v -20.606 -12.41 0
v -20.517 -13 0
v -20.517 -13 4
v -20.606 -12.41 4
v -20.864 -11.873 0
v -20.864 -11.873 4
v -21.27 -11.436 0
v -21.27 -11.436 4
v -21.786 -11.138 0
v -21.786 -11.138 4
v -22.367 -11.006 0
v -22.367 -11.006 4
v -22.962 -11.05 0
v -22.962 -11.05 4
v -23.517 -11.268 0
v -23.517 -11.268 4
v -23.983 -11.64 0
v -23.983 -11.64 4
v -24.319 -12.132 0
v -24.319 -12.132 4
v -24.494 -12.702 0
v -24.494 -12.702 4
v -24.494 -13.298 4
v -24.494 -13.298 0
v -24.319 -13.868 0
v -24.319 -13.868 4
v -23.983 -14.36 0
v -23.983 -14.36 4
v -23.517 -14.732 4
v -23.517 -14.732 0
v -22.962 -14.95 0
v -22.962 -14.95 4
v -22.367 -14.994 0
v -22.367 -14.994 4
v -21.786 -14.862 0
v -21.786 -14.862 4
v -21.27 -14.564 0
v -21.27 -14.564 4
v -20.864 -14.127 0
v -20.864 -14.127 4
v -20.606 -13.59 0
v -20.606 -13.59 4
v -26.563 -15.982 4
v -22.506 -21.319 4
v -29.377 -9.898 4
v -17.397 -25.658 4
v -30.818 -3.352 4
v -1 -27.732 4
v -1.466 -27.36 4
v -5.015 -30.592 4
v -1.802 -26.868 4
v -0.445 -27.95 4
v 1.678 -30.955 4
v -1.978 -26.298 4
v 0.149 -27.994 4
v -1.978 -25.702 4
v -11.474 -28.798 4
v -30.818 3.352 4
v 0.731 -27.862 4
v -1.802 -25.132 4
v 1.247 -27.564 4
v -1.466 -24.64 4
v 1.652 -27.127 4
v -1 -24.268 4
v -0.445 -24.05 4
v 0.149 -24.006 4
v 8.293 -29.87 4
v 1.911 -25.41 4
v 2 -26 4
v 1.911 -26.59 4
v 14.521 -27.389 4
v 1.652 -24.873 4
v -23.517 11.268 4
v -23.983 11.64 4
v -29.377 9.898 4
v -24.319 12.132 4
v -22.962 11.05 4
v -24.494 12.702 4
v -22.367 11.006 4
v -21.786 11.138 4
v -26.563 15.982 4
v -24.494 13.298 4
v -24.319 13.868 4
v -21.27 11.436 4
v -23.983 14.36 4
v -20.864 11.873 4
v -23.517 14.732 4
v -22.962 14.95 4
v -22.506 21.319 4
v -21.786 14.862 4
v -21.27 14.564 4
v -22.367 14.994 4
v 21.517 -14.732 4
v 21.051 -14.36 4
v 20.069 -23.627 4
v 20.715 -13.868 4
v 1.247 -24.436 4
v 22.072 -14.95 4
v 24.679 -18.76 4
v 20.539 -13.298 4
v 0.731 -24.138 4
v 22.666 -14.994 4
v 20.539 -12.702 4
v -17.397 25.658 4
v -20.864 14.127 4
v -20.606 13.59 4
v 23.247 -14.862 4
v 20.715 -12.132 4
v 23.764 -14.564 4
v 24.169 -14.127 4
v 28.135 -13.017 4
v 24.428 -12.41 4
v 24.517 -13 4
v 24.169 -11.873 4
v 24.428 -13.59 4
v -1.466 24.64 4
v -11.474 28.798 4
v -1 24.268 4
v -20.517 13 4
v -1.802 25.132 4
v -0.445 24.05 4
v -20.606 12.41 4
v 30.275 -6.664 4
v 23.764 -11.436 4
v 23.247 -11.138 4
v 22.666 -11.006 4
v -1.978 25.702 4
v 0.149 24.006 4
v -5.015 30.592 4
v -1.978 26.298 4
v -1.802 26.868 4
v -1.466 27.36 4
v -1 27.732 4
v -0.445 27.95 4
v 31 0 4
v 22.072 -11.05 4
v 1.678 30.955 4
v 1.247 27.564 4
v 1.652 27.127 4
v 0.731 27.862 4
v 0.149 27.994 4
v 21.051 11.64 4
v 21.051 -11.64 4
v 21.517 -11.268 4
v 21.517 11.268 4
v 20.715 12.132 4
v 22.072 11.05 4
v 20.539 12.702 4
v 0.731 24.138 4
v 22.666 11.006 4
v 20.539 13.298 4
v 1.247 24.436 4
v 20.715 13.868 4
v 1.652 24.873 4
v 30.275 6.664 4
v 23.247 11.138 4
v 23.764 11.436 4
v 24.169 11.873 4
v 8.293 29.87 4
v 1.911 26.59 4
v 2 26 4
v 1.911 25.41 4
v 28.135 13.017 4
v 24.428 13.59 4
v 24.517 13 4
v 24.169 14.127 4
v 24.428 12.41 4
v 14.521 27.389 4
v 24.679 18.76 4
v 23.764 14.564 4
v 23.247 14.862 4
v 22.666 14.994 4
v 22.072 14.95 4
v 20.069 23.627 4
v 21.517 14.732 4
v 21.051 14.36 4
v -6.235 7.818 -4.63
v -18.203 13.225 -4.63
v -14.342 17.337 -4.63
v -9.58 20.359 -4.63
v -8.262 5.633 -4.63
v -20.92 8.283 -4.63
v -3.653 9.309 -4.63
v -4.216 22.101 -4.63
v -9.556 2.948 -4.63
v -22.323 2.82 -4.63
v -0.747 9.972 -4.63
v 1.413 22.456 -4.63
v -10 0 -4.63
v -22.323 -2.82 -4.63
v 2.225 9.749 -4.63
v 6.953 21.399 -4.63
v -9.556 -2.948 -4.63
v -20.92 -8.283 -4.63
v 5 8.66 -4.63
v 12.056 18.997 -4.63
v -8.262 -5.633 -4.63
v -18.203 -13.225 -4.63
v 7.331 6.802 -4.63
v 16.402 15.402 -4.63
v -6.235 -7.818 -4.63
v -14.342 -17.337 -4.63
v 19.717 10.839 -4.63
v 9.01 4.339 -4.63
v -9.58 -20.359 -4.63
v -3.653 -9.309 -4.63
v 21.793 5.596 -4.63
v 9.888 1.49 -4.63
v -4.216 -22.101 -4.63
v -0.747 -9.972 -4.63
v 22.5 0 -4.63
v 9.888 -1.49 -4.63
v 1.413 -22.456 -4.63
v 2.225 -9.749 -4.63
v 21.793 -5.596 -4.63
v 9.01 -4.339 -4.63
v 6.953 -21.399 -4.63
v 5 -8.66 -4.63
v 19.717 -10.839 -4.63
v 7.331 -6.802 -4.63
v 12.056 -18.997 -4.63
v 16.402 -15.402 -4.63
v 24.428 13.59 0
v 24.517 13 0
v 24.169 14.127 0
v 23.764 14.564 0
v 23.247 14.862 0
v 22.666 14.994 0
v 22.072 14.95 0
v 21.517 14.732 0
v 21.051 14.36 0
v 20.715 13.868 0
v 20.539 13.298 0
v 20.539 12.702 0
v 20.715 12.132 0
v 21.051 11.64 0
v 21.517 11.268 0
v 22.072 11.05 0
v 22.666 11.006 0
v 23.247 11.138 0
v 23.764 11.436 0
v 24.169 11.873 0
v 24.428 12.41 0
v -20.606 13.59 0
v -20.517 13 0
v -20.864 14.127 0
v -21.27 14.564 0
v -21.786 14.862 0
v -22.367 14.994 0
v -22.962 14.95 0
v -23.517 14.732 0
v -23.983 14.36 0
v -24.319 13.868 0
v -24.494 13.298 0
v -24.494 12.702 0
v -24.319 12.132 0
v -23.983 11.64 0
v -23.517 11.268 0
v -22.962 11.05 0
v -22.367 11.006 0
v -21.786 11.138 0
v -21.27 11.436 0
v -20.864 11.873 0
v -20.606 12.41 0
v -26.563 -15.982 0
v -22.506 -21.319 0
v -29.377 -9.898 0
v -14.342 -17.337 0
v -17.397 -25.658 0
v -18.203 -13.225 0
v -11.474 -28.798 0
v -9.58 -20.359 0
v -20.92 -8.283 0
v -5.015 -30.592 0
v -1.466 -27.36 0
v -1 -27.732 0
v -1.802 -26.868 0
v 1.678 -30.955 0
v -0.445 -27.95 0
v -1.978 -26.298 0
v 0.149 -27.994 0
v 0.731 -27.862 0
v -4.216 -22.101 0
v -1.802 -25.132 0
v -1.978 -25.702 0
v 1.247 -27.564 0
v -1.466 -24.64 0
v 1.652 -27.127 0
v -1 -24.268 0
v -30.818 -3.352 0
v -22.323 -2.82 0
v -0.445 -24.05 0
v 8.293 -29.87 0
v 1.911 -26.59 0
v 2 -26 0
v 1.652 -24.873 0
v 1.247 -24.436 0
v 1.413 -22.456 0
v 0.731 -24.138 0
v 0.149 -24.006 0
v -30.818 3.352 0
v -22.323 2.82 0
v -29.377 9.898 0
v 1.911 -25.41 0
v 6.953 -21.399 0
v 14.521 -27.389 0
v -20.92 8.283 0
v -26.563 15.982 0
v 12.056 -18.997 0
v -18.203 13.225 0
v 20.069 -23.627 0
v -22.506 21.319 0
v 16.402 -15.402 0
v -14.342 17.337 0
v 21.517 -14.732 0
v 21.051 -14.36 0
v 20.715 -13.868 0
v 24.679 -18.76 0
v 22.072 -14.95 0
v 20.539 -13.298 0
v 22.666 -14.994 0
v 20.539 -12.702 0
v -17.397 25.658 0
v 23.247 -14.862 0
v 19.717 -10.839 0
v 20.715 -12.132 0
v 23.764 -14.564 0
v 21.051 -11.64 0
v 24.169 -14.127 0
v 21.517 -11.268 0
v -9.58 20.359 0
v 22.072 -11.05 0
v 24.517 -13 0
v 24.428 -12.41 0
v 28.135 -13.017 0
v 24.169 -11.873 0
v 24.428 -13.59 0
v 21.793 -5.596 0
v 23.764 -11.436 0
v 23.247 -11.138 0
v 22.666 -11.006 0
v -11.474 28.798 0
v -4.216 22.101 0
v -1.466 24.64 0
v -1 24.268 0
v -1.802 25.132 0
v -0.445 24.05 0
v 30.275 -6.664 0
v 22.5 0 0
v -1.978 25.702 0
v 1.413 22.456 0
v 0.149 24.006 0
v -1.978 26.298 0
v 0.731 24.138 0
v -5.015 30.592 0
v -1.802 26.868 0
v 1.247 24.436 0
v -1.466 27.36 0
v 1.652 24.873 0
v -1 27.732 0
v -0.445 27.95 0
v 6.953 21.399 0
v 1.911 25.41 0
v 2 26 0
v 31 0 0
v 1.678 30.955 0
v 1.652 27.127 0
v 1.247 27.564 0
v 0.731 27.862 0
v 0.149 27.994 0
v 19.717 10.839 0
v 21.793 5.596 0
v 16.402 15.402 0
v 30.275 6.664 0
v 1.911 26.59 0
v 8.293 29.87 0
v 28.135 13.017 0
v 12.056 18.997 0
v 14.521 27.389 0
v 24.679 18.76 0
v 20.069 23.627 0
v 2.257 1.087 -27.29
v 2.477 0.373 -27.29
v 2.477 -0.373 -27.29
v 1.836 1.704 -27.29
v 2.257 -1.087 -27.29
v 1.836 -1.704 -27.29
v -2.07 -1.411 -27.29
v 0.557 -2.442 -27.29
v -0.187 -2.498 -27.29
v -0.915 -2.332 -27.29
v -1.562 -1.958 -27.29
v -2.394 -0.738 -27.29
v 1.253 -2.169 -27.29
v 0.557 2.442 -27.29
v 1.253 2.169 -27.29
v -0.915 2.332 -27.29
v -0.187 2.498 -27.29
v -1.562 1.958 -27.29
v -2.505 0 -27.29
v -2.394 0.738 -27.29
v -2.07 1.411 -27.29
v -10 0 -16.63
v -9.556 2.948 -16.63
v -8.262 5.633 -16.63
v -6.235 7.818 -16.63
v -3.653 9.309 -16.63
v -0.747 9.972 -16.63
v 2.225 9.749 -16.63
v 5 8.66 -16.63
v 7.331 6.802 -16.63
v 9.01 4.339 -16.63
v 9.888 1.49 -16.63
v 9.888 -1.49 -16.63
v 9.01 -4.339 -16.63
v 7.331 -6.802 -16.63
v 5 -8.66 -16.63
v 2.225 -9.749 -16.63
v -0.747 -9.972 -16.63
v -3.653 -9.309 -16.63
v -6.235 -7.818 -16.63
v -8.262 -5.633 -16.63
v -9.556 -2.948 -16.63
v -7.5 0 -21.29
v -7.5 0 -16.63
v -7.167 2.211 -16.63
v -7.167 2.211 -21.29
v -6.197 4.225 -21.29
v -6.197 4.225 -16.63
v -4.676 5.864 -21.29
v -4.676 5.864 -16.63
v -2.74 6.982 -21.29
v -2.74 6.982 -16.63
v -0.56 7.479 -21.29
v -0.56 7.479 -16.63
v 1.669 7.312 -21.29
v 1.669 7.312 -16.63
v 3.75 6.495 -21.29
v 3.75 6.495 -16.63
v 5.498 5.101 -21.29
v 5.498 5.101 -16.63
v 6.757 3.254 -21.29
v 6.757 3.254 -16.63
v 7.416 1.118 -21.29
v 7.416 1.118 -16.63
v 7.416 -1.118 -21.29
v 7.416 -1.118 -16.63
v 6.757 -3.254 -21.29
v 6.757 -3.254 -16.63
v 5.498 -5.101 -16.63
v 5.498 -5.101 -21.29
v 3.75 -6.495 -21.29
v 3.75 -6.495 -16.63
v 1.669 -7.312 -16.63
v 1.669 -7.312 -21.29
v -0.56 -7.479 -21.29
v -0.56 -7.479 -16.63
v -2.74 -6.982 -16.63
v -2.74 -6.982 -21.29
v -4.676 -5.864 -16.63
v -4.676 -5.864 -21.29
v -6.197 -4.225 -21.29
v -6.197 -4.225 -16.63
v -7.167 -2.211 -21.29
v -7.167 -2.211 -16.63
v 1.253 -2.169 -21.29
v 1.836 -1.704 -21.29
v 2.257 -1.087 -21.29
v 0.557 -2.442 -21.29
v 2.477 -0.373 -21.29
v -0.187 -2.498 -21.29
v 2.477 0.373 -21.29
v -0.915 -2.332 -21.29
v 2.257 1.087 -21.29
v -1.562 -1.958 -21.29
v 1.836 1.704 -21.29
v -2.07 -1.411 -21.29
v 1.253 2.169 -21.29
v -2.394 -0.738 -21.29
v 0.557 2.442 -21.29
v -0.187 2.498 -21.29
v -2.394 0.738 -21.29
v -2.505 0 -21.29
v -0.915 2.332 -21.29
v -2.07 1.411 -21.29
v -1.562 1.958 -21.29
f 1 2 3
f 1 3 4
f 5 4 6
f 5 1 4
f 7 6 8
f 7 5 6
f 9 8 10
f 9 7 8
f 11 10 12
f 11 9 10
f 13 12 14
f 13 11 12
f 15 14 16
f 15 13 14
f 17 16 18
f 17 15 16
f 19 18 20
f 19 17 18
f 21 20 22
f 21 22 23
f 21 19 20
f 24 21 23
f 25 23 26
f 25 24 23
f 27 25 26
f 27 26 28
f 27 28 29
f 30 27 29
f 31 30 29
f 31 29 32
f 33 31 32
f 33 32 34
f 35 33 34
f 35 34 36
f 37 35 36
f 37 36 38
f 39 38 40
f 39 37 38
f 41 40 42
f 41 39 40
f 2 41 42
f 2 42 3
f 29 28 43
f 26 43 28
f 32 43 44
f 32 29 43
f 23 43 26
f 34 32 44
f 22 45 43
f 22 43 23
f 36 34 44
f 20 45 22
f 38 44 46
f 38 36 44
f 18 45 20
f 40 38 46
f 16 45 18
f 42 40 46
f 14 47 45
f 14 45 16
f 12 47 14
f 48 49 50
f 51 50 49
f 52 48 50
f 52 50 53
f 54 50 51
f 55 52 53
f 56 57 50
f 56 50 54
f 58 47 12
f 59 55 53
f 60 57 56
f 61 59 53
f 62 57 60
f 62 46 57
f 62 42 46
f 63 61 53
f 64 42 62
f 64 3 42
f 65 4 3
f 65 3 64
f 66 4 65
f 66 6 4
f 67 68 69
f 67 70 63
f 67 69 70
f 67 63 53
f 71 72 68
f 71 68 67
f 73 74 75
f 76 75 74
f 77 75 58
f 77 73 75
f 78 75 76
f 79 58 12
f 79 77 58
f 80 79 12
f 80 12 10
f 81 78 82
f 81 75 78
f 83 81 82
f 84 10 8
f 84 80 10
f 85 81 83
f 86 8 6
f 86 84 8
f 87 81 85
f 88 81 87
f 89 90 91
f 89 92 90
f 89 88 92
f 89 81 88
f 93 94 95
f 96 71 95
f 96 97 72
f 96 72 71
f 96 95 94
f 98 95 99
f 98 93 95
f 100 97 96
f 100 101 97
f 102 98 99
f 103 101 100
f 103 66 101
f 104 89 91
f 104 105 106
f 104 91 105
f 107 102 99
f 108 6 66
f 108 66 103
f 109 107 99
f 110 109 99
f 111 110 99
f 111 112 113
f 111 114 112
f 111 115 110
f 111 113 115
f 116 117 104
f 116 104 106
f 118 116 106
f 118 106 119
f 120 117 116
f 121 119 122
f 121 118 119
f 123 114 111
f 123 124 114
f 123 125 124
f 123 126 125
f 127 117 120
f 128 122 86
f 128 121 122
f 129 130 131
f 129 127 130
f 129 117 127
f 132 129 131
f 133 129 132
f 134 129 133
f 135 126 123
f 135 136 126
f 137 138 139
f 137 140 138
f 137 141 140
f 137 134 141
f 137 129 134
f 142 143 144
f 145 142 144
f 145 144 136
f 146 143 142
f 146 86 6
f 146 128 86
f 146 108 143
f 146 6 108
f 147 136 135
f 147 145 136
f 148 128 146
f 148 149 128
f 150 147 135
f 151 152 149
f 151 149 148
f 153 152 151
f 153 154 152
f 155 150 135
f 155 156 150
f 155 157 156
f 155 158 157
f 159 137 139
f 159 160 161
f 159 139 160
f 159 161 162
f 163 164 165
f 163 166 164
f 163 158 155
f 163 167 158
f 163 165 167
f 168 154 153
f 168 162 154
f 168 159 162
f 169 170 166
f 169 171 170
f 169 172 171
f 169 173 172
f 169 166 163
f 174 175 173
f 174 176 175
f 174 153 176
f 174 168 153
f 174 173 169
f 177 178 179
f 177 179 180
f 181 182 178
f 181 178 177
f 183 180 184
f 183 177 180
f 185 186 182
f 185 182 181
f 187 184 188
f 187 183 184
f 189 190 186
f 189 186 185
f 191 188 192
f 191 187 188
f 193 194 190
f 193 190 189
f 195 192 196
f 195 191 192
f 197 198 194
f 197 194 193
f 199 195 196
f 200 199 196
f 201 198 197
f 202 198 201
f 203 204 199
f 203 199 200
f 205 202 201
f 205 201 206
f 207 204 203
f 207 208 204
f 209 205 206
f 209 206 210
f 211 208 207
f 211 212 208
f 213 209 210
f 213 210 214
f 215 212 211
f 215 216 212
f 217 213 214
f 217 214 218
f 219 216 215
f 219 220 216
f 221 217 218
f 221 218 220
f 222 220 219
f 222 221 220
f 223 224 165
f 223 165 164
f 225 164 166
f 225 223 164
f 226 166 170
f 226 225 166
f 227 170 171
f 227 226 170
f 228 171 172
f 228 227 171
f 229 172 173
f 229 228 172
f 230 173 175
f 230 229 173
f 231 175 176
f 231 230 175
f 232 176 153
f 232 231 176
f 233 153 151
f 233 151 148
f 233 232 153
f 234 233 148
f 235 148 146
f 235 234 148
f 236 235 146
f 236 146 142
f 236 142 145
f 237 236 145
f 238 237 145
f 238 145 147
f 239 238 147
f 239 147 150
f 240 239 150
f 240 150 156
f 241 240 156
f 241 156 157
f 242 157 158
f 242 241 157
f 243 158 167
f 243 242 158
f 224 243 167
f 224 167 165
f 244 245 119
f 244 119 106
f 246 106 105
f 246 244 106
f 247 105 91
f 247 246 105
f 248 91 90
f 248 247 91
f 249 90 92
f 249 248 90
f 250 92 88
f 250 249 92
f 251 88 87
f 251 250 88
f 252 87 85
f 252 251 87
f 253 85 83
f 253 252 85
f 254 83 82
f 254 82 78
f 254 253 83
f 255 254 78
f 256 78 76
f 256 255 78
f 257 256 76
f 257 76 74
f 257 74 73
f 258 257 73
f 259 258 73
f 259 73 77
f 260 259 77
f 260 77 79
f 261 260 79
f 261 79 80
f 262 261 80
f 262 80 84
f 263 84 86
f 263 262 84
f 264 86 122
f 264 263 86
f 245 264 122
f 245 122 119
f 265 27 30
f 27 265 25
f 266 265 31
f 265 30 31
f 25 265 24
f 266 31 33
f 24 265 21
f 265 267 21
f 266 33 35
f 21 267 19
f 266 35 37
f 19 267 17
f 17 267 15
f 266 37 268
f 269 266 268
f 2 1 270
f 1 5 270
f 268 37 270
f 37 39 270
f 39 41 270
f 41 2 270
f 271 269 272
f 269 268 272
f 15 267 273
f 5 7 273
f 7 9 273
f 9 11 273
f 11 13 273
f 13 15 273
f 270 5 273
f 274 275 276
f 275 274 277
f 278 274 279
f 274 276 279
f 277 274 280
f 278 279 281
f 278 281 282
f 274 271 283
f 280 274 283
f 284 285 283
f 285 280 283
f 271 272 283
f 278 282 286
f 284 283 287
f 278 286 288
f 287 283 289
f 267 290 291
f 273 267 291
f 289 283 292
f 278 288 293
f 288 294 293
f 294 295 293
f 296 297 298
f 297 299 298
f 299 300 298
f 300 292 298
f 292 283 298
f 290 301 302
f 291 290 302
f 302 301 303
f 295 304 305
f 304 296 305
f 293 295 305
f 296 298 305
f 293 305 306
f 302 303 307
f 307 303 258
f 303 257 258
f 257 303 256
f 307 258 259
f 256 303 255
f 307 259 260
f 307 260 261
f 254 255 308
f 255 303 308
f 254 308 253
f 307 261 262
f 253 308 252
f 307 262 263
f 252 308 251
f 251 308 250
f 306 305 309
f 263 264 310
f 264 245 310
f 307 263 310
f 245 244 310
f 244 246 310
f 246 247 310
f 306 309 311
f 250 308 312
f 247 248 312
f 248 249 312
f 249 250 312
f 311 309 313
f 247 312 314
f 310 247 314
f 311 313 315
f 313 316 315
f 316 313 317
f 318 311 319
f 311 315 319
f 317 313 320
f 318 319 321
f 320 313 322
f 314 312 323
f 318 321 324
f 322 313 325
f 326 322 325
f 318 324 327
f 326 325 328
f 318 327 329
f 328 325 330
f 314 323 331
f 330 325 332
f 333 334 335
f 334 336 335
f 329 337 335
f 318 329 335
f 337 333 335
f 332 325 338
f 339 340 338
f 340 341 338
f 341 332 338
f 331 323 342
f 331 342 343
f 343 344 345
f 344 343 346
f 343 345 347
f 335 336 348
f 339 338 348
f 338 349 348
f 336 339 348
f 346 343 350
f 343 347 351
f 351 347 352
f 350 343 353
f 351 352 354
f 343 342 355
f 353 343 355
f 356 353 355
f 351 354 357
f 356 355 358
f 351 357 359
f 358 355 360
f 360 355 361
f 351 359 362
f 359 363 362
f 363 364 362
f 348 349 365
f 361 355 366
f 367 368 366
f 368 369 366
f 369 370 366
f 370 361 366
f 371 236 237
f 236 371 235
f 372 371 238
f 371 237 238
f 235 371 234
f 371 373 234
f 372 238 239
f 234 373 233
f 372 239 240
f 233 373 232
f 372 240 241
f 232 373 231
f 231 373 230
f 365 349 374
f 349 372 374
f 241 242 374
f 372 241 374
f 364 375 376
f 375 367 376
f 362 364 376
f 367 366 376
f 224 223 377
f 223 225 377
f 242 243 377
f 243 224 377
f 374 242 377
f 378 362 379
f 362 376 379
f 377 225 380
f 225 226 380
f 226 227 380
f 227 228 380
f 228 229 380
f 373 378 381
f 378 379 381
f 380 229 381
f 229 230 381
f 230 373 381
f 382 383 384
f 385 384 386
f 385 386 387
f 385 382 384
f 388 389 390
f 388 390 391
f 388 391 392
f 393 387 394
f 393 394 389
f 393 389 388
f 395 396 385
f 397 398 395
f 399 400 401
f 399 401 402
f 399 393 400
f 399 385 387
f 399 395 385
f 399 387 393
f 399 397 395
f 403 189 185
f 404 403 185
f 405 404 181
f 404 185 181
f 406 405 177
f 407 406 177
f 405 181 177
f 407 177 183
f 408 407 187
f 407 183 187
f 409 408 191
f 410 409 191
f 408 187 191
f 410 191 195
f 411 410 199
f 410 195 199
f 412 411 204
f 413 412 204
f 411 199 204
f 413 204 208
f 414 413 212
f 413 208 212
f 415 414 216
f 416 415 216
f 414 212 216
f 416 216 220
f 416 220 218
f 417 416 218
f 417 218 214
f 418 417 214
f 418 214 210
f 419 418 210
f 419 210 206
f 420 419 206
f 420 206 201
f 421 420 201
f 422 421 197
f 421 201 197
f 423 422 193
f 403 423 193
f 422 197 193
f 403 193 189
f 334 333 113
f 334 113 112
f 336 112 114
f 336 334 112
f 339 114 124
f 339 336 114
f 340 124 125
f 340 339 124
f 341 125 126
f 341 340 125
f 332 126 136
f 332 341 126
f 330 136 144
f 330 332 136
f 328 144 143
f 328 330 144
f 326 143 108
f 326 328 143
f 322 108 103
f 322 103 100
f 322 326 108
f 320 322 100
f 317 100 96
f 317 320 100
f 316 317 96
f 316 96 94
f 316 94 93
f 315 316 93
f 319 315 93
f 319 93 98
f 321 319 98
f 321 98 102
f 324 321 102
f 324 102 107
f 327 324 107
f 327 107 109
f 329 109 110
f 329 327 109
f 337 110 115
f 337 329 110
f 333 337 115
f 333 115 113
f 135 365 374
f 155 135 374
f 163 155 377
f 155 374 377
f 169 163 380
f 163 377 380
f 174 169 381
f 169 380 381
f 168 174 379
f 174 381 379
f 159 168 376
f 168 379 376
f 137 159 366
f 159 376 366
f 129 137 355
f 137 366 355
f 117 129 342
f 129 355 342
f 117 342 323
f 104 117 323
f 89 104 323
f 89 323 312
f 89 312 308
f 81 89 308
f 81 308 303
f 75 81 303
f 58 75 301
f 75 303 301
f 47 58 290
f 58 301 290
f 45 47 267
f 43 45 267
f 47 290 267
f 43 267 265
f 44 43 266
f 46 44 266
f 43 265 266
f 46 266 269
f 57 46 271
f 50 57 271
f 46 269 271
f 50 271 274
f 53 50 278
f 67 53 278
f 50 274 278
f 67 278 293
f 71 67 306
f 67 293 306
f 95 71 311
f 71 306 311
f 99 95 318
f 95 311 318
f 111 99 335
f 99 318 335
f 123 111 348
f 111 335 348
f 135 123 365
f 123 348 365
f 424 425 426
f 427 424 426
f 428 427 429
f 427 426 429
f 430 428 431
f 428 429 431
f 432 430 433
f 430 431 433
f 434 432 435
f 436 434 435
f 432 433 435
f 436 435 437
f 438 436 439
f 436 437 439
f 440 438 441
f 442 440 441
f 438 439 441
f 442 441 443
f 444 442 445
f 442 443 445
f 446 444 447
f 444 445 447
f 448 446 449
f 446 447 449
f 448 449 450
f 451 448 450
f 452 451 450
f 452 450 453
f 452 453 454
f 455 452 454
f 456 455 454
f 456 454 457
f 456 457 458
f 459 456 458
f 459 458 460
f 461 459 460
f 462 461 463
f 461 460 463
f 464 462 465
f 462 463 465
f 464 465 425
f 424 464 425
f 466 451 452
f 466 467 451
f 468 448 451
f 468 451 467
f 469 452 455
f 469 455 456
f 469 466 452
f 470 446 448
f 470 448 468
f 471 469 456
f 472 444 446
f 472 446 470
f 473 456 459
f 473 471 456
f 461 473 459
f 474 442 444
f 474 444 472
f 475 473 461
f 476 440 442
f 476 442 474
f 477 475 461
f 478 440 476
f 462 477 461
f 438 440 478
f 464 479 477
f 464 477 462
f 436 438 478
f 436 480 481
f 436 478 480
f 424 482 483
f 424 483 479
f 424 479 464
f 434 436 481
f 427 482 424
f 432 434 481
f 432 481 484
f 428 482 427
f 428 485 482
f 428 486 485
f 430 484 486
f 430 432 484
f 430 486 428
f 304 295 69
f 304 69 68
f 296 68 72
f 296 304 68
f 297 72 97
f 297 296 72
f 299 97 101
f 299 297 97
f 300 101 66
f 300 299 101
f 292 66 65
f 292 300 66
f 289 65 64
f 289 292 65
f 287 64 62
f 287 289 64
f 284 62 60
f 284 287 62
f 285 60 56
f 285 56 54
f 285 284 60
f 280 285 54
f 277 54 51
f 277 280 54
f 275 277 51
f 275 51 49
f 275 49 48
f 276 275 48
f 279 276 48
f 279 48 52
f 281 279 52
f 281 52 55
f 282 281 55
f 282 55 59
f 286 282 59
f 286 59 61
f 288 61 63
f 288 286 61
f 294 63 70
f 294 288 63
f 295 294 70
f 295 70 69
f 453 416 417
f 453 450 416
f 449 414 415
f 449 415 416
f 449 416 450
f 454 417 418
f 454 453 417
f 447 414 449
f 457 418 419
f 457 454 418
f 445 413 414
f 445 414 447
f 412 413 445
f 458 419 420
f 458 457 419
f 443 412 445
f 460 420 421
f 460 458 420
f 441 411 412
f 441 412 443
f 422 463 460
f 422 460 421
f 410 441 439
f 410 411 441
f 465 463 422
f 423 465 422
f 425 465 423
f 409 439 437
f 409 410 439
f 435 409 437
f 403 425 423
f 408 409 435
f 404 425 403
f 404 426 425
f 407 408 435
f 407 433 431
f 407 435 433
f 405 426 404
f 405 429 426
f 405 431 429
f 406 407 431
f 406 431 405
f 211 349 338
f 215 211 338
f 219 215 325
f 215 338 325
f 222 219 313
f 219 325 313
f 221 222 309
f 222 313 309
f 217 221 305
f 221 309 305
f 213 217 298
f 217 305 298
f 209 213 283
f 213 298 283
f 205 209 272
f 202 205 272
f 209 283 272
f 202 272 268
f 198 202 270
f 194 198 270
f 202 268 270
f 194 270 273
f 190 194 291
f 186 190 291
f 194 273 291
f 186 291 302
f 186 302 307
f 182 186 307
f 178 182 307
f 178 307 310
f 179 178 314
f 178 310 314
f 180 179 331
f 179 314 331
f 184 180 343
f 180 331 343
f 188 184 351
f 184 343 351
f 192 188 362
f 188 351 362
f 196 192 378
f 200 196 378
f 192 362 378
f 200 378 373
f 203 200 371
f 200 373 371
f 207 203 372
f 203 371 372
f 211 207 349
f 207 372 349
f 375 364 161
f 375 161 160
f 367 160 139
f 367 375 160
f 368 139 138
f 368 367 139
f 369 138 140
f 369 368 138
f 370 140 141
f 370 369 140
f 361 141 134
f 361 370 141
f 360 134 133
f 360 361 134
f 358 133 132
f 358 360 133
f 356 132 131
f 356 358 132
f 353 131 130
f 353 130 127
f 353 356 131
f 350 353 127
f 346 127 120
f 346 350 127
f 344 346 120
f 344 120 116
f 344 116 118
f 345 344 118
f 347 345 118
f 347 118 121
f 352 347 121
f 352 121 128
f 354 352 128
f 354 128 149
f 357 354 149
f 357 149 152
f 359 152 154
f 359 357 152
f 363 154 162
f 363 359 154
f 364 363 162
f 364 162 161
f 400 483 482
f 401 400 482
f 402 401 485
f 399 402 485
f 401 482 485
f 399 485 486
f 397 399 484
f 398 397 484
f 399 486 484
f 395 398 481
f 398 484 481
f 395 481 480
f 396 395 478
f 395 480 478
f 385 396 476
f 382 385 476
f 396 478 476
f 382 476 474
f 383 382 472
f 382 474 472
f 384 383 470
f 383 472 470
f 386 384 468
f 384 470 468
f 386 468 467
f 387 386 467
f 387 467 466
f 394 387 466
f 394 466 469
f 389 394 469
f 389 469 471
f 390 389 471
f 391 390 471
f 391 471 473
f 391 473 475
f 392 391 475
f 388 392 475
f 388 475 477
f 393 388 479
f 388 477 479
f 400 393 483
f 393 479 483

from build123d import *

# Parameters (mm, degrees)
SKETCH1_R           = 31
SKETCH1_R_2         = 2
BOSS_EXTRUDE1_DEPTH = 4
SKETCH2_R           = 22.5
BOSS_EXTRUDE2_DEPTH = 4.63
SKETCH3_R           = 10
BOSS_EXTRUDE3_DEPTH = 12
SKETCH4_R           = 7.5
BOSS_EXTRUDE4_DEPTH = 4.66
SKETCH7_R           = 2.505
BOSS_EXTRUDE5_DEPTH = 6


with BuildPart() as part:
    # Sketch1 → Boss-Extrude1 (new body)
    with BuildSketch(Plane.XY):
        Circle(SKETCH1_R)
        with Locations((0, 26)):
            Circle(SKETCH1_R_2, mode=Mode.SUBTRACT)
        with Locations((22.516660498, 13)):
            Circle(SKETCH1_R_2, mode=Mode.SUBTRACT)
        with Locations((22.516660498, -13)):
            Circle(SKETCH1_R_2, mode=Mode.SUBTRACT)
        with Locations((0, -26)):
            Circle(SKETCH1_R_2, mode=Mode.SUBTRACT)
        with Locations((-22.516660498, -13)):
            Circle(SKETCH1_R_2, mode=Mode.SUBTRACT)
        with Locations((-22.516660498, 13)):
            Circle(SKETCH1_R_2, mode=Mode.SUBTRACT)
    extrude(amount=BOSS_EXTRUDE1_DEPTH)

    # Sketch2 → Boss-Extrude2 (add)
    with BuildSketch(Plane(origin=(0, 0, 0), x_dir=(-1, 0, 0), z_dir=(0, 0, -1))):
        with Locations(Location((0, 0, 0), (0, 0, 180))):
            Circle(SKETCH2_R)
    extrude(amount=BOSS_EXTRUDE2_DEPTH)

    # Sketch3 → Boss-Extrude3 (add)
    with BuildSketch(Plane(origin=(0, 0, -4.63), x_dir=(-1, 0, 0), z_dir=(0, 0, -1))):
        Circle(SKETCH3_R)
    extrude(amount=BOSS_EXTRUDE3_DEPTH)

    # Sketch4 → Boss-Extrude4 (add)
    with BuildSketch(Plane(origin=(0, 0, -16.63), x_dir=(-1, 0, 0), z_dir=(0, 0, -1))):
        Circle(SKETCH4_R)
    extrude(amount=BOSS_EXTRUDE4_DEPTH)

    # Sketch7 → Boss-Extrude5 (add)
    with BuildSketch(Plane(origin=(0, 0, -21.29), x_dir=(-1, 0, 0), z_dir=(0, 0, -1))):
        Circle(SKETCH7_R)
    extrude(amount=BOSS_EXTRUDE5_DEPTH)


solid = part.part
